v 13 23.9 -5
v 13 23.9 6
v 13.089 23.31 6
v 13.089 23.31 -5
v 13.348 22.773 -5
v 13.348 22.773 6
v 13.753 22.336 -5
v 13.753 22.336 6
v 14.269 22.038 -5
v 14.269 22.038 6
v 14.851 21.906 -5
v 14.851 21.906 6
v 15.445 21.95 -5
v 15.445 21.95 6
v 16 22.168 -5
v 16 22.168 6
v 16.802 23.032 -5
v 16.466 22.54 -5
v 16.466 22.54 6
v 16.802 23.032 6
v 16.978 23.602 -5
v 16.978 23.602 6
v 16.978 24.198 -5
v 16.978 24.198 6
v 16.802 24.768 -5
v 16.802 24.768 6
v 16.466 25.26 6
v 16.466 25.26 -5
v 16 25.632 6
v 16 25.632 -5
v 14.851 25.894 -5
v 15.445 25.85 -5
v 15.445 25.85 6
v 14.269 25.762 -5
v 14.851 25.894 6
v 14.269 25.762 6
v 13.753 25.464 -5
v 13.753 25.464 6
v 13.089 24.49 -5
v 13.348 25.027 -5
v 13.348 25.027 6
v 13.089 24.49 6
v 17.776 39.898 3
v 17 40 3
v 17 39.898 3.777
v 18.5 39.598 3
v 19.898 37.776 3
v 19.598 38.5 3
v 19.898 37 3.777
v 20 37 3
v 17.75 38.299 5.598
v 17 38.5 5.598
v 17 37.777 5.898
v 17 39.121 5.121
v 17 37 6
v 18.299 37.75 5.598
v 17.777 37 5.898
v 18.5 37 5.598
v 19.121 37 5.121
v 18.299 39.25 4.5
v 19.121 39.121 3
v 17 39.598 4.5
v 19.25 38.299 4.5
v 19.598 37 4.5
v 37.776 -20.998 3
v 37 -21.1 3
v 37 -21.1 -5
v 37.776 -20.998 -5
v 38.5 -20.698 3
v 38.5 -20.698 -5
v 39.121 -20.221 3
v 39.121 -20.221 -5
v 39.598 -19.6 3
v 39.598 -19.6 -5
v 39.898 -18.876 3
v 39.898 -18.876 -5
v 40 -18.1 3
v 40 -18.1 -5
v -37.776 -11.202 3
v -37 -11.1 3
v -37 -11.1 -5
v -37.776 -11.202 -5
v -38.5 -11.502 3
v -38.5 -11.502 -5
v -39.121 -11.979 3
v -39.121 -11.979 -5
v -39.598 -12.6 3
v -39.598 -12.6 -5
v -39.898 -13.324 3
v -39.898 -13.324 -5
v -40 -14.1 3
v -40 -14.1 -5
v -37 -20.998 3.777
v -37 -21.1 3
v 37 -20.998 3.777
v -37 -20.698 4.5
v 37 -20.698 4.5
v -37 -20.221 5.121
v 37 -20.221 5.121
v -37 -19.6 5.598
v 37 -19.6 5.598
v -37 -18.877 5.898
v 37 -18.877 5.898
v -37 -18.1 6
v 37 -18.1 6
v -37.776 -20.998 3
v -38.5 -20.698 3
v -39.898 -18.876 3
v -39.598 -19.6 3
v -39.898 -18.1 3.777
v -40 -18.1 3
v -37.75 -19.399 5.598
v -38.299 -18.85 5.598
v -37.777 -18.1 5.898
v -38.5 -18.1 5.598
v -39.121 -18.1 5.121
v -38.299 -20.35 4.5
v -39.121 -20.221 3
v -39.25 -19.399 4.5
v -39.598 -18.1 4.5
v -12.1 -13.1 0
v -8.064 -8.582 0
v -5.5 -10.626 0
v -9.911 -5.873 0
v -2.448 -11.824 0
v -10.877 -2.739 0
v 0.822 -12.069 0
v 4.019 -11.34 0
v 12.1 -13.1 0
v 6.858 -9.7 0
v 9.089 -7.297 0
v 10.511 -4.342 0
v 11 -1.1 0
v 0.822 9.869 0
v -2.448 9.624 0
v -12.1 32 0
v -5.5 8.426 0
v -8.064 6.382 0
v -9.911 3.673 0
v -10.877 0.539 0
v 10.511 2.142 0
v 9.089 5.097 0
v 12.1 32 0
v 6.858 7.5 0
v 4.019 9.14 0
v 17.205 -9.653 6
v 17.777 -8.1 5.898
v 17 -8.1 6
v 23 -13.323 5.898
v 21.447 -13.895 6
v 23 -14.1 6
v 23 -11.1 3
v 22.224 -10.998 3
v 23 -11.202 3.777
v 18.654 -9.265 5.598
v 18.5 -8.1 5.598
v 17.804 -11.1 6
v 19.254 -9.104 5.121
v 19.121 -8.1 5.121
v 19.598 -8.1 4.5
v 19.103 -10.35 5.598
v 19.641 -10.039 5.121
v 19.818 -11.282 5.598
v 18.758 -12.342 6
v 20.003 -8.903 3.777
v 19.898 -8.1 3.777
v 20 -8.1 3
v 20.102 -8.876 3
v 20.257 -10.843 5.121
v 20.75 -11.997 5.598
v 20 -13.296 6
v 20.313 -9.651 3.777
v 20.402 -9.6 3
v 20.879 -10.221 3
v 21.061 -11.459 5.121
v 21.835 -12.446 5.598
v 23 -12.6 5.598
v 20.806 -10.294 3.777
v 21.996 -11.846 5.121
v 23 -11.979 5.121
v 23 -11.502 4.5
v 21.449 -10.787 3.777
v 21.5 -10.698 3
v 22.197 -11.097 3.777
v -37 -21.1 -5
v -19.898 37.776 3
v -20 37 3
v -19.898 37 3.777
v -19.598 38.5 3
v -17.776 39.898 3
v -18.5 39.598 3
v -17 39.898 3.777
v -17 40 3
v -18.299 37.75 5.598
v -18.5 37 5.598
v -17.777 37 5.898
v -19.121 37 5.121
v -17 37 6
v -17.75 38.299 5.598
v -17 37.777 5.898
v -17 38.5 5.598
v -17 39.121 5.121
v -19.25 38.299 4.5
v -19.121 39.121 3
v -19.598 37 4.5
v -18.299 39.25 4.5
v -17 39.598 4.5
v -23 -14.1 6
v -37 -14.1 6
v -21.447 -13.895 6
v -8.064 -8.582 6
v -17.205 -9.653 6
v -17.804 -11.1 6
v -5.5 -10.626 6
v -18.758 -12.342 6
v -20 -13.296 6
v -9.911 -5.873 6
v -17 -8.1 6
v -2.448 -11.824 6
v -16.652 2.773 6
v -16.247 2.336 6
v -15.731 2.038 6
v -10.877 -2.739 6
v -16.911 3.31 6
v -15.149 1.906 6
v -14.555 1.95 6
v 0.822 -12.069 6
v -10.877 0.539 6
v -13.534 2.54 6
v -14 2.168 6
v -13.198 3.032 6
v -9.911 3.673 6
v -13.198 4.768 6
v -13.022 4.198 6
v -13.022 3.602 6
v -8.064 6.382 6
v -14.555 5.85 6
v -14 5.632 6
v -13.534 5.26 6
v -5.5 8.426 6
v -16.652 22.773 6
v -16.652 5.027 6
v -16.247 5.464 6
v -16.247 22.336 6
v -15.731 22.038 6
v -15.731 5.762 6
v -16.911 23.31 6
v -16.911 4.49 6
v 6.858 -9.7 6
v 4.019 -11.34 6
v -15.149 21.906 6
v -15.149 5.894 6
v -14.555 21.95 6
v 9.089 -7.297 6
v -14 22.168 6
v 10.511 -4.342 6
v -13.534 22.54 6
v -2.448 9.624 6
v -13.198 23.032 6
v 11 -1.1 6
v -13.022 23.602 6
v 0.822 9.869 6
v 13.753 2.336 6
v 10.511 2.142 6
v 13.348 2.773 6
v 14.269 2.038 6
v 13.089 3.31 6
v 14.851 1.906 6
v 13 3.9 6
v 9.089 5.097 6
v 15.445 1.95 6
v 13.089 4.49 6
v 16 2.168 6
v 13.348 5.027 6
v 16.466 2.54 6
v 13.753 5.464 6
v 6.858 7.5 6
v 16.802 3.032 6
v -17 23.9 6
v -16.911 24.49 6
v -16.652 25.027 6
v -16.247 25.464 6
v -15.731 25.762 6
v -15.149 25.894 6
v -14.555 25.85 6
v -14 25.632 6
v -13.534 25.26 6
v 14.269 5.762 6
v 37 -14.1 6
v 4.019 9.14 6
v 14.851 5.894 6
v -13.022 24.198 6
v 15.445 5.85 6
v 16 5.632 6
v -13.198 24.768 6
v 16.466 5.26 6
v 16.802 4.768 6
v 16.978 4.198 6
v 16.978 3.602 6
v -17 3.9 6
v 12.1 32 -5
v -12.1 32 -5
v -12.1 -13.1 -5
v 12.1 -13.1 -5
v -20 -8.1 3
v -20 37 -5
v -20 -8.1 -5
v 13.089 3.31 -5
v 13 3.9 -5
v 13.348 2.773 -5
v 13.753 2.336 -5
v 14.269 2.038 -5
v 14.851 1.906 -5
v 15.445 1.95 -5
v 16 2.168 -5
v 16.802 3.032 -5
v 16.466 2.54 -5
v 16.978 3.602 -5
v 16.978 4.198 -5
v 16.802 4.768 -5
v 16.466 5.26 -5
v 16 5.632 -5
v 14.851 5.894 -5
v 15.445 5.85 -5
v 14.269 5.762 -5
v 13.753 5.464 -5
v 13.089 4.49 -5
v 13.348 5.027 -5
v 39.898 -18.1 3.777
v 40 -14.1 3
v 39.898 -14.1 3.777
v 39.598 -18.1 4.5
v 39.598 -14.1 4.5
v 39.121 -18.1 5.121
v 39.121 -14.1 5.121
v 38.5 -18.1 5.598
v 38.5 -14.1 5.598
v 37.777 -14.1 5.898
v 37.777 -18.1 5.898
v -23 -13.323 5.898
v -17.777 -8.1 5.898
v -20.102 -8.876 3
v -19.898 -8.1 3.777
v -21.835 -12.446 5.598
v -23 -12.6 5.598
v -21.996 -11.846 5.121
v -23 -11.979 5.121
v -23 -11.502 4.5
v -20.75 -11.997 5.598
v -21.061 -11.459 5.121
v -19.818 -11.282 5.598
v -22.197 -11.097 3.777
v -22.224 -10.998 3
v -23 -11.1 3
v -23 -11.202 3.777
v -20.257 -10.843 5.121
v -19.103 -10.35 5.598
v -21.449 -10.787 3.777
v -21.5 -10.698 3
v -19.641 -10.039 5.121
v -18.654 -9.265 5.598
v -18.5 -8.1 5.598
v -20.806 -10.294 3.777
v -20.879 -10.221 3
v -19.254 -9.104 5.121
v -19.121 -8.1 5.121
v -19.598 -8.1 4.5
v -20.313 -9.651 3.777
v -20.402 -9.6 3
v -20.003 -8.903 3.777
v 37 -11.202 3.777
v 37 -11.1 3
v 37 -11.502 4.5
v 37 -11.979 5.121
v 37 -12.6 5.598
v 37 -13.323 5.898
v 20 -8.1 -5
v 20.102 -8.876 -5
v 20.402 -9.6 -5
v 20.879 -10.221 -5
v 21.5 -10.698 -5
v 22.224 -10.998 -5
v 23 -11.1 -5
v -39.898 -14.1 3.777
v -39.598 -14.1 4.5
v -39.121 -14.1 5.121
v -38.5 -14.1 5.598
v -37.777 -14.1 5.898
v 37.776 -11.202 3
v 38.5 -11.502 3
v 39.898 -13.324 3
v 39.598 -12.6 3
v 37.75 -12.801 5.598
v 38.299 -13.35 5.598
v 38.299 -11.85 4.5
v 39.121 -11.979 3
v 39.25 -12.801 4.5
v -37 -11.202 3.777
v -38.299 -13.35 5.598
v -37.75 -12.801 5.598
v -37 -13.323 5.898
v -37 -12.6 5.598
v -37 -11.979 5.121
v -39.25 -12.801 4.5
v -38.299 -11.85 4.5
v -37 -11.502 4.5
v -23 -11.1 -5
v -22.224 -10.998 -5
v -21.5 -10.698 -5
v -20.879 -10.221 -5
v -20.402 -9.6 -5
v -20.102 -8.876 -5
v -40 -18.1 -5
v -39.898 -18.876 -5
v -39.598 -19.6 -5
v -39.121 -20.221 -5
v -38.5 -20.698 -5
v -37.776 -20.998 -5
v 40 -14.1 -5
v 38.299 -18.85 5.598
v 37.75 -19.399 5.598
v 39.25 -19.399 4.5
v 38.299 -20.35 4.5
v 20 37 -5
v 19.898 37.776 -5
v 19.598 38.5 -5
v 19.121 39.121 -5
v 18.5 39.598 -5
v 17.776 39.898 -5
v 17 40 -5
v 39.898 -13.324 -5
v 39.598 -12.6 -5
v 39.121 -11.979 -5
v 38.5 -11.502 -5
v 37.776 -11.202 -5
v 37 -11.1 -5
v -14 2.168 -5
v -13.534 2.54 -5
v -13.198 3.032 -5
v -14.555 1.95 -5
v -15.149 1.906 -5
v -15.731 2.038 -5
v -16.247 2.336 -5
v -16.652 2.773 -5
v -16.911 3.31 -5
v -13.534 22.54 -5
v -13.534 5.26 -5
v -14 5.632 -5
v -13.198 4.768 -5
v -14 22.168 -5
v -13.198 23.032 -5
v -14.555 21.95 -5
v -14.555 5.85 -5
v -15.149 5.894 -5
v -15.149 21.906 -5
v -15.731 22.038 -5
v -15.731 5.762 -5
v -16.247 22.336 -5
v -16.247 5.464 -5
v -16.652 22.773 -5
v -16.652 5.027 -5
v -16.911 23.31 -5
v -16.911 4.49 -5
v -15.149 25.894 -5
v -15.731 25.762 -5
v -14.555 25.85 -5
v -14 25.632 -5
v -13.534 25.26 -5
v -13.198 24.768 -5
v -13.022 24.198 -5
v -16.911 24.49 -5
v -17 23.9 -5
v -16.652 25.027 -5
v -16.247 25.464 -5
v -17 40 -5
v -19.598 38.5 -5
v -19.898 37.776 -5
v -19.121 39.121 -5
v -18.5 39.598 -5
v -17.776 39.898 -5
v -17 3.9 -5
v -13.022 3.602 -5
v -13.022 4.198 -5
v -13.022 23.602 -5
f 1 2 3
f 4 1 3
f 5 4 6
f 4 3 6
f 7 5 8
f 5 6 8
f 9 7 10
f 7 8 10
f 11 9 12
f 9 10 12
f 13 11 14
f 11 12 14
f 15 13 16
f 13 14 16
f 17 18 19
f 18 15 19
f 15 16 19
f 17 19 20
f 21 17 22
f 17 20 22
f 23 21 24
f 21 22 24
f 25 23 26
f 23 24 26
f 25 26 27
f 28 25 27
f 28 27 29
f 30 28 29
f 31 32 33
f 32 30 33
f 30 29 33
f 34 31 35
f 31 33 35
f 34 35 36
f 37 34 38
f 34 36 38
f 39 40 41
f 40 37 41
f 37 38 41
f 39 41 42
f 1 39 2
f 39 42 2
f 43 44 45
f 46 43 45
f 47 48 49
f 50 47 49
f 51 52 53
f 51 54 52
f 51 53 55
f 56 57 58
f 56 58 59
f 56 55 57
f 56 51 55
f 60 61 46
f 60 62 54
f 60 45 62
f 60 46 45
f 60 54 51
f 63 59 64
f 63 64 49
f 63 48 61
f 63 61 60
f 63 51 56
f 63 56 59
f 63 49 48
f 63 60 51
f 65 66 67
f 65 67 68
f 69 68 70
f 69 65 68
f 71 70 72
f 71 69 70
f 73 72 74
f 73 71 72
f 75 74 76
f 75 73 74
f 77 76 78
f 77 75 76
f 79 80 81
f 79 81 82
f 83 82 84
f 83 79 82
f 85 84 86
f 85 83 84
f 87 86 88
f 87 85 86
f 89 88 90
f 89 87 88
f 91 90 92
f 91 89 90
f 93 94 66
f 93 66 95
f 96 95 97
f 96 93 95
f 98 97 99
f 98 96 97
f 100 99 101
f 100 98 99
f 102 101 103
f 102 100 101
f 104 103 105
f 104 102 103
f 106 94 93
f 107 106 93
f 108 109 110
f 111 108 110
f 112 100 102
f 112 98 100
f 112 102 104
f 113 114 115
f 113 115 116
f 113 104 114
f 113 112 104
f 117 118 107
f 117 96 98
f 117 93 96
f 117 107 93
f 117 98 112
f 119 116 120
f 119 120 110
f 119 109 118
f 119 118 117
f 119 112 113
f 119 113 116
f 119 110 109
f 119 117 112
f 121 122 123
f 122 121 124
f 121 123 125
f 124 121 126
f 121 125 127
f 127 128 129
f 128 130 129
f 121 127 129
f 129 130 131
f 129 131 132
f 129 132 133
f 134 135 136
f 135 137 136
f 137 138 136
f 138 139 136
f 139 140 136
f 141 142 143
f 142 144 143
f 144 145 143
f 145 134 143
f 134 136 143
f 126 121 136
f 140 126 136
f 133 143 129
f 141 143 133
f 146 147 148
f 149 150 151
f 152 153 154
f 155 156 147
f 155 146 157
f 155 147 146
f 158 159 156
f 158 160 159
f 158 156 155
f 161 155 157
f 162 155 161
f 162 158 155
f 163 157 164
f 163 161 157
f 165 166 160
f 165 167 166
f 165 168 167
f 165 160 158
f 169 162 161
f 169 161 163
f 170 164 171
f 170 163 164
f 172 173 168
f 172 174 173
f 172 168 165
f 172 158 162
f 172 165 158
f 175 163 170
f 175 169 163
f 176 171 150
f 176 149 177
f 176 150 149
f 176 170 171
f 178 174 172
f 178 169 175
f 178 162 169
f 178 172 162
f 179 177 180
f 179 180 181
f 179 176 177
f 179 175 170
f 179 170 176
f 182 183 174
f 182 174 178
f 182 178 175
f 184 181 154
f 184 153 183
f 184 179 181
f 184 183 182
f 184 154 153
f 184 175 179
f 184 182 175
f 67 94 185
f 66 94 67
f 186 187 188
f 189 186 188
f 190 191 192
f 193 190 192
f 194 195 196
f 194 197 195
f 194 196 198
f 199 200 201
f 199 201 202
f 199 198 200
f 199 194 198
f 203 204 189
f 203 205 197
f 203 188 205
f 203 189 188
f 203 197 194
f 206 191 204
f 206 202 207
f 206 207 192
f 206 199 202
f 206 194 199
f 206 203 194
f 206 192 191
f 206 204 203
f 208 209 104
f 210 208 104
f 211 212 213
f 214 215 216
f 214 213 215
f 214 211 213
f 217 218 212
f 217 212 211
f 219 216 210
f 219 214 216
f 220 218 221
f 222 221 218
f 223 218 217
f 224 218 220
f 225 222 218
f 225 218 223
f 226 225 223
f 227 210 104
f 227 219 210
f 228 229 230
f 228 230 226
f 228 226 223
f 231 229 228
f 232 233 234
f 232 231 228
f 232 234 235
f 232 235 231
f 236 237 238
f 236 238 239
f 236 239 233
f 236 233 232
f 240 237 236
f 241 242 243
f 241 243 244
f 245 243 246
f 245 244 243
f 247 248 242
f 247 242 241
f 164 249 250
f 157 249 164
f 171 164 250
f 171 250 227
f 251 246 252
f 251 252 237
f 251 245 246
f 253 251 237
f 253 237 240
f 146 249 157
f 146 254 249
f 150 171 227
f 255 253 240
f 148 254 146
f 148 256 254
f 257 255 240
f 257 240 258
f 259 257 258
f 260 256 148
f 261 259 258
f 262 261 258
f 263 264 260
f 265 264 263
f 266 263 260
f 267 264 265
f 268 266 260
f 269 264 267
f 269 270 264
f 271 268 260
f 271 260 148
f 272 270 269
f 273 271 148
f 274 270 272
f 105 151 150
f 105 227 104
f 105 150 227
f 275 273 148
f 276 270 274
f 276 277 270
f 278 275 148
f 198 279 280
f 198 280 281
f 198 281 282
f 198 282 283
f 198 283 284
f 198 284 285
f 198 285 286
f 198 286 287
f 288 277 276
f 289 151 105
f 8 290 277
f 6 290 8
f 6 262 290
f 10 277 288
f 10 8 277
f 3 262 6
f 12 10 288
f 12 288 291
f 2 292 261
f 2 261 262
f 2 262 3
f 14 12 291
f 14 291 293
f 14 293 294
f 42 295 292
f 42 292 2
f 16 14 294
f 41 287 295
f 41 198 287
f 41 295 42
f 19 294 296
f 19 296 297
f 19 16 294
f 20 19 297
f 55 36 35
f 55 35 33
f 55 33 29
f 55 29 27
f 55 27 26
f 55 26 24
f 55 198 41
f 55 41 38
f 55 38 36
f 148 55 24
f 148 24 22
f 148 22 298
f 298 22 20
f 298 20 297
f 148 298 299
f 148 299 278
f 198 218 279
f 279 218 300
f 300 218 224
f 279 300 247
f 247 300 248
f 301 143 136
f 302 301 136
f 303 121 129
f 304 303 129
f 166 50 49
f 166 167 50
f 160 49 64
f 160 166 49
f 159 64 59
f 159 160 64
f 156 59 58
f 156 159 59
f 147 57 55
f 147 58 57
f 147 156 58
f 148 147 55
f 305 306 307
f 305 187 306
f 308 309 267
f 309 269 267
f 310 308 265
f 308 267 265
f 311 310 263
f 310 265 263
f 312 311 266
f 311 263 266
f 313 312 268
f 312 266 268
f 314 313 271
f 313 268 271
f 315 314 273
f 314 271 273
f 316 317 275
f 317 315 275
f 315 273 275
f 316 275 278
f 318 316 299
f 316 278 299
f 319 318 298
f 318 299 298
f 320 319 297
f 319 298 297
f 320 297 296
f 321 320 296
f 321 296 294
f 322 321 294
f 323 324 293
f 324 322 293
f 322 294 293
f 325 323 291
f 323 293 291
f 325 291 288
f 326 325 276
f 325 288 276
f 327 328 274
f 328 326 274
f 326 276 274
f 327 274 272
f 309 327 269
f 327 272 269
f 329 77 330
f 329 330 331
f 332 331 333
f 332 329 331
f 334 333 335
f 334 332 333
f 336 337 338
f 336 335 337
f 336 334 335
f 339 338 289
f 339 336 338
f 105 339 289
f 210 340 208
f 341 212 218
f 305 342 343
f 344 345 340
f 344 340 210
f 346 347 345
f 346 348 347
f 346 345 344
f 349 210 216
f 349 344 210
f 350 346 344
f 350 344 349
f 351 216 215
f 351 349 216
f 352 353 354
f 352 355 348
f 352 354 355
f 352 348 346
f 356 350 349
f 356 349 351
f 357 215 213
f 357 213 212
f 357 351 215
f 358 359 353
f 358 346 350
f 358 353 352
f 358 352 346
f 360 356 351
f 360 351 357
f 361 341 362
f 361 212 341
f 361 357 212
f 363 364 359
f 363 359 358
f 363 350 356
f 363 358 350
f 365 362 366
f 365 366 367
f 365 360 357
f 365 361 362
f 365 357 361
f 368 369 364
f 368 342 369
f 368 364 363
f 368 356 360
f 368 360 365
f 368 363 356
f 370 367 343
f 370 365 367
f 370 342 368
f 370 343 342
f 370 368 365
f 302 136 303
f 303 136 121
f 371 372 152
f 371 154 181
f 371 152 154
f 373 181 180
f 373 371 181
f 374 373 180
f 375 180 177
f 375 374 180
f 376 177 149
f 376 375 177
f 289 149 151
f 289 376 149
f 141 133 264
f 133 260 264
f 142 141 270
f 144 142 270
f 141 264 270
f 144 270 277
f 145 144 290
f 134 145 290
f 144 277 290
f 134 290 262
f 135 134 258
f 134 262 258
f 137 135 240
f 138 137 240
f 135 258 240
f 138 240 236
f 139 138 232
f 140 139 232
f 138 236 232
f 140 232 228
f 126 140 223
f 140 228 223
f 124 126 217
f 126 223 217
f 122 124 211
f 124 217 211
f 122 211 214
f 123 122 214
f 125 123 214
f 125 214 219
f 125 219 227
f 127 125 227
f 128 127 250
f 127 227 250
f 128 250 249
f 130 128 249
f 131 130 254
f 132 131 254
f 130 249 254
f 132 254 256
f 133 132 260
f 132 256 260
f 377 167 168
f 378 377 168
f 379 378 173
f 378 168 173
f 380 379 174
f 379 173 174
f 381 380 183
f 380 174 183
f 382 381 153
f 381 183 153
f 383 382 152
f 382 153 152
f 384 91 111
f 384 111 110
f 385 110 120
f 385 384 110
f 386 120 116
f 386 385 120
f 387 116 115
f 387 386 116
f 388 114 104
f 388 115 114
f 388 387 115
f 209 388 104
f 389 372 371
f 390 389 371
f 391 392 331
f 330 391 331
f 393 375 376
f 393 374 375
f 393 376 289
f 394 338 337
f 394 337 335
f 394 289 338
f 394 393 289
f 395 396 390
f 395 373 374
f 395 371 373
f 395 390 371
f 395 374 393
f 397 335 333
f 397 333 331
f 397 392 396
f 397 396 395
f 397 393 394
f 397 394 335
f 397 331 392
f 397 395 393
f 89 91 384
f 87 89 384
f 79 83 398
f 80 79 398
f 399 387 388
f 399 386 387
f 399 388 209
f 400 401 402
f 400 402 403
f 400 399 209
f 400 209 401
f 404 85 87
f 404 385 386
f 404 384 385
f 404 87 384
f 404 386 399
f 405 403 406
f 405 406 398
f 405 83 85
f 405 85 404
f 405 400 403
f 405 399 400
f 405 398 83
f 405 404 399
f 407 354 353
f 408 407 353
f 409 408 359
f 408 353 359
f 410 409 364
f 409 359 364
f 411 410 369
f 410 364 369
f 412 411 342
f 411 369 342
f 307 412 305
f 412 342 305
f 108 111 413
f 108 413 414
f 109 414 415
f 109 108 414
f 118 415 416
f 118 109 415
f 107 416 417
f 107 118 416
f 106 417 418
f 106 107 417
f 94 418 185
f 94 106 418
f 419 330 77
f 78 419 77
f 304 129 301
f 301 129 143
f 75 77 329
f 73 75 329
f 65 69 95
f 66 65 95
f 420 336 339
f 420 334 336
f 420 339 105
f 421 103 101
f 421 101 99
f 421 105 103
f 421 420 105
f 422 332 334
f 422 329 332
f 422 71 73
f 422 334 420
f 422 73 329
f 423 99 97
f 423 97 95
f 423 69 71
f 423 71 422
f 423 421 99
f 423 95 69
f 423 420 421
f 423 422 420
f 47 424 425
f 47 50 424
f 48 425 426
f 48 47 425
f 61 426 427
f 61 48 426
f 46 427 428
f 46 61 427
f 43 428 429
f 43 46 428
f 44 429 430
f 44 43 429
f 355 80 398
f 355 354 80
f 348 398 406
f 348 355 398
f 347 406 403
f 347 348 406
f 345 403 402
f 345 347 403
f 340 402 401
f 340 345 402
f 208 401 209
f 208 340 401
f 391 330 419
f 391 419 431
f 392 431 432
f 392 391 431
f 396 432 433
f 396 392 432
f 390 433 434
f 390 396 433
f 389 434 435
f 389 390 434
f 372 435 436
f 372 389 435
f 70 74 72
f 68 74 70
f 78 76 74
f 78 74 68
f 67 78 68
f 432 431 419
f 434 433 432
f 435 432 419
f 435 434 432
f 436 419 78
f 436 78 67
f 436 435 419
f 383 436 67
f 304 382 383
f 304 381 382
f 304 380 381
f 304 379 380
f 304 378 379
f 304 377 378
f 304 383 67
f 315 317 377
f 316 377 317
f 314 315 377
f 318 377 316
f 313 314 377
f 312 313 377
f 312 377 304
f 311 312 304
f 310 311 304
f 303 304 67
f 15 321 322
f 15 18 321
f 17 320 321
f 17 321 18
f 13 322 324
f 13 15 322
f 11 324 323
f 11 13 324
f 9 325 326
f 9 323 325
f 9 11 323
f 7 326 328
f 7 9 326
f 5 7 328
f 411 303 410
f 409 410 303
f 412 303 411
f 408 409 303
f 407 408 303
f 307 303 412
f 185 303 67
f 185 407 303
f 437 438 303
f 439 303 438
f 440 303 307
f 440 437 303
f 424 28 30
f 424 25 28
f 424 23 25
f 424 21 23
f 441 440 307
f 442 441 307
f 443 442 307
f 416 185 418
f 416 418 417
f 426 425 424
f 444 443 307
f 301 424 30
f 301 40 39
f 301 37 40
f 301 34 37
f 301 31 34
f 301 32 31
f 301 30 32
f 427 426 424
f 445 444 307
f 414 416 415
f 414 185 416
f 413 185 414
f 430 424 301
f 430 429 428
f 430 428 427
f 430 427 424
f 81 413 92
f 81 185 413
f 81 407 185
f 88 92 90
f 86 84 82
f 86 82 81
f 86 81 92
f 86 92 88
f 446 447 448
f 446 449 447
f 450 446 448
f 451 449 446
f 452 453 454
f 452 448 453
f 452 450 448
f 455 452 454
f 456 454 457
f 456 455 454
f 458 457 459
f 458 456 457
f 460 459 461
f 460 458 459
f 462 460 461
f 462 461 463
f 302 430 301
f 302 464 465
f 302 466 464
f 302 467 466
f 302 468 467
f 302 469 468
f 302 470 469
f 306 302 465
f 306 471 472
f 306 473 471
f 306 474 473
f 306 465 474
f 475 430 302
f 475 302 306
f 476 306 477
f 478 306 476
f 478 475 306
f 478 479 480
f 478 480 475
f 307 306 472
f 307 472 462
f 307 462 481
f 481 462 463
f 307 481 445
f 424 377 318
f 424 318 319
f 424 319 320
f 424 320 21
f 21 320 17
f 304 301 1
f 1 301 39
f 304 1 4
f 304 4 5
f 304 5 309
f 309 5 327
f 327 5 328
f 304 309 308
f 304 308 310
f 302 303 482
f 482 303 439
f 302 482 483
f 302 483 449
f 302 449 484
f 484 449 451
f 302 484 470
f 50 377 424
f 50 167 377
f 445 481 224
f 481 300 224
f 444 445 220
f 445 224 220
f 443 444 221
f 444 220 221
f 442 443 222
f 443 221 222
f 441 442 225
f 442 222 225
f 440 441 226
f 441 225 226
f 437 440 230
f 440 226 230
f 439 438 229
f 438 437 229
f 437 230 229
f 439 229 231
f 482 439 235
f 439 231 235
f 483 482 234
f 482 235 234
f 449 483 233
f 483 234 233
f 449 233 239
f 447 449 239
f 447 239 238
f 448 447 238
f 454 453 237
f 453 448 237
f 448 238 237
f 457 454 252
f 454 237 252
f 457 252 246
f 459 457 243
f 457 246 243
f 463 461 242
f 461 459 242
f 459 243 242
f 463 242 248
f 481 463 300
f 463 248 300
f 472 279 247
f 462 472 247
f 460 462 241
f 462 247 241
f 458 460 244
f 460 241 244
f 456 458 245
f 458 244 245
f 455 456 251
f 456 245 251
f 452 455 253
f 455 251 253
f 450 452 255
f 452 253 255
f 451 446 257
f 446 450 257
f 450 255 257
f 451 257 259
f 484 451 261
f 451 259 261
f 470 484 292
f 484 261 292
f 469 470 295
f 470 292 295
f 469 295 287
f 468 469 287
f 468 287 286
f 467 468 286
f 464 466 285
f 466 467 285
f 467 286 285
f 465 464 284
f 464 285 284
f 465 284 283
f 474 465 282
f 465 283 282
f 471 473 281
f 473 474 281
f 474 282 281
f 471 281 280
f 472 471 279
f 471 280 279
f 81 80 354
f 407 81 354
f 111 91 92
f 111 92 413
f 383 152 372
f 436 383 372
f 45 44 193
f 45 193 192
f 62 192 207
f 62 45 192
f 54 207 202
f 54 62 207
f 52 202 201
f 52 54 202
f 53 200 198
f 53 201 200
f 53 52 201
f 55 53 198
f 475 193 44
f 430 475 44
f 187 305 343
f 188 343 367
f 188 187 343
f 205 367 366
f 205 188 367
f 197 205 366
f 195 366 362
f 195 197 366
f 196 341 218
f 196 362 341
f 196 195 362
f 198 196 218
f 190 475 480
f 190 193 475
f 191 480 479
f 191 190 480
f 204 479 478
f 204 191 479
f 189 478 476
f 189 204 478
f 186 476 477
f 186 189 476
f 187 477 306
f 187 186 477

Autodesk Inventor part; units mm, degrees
ref_plane "YZ Plane" through (0, 0, 0) normal (1, 0, 0) x (0, 1, 0)
ref_plane "XZ Plane" through (0, 0, 0) normal (0, 1, 0) x (-1, 0, 0)
ref_plane "XY Plane" through (0, 0, 0) normal (0, 0, 1) x (1, 0, 0)
sketch "Sketch1" plane through (0, 0, 0) normal (0, 0, 1) x (1, 0, 0)
  line L0 (-40, -40) -> (40, -40)
  line L1 (40, -40) -> (40, 40)
  line L2 (40, 40) -> (-40, 40)
  line L3 (-40, 40) -> (-40, -40)
  line L4 (-40, -40) -> (40, 40) construction
  line L5 (40, -40) -> (-40, 40) construction
  point P0 (0, 0)
  dimension "d0" = 80
  dimension "d1" = 80
extrude "Extrusion1" add sketch "Sketch1" along normal blind 6
sketch "Sketch2" plane through (0, 0, 0) normal (0, 0, -1) x (-1, 0, 0)
  arc A0 (37, -21.1) -> (40, -18.1) centre (37, -18.1) ccw projected
  line L0 (37, -21.1) -> (-37, -21.1) projected
  arc A1 (-40, -18.1) -> (-37, -21.1) centre (-37, -18.1) ccw projected
  line L1 (-40, -14.1) -> (-40, -18.1) projected
  arc A2 (-37, -11.1) -> (-40, -14.1) centre (-37, -14.1) ccw projected
  line L2 (-23, -11.1) -> (-37, -11.1) projected
  arc A3 (-23, -11.1) -> (-20, -8.1) centre (-23, -8.1) ccw projected
  line L3 (-20, -8.1) -> (-20, 37) projected
  arc A4 (-17, 40) -> (-20, 37) centre (-17, 37) ccw projected
  line L4 (17, 40) -> (-17, 40) projected
  arc A5 (20, 37) -> (17, 40) centre (17, 37) ccw projected
  line L5 (20, 37) -> (20, -8.1) projected
  arc A6 (20, -8.1) -> (23, -11.1) centre (23, -8.1) ccw projected
  line L6 (37, -11.1) -> (23, -11.1) projected
  arc A7 (40, -14.1) -> (37, -11.1) centre (37, -14.1) ccw projected
  line L7 (40, -14.1) -> (40, -18.1) projected
  circle A8 centre (15, 3.9) radius 2 projected
  circle A9 centre (-15, 3.9) radius 2 projected
  circle A10 centre (15, 23.9) radius 2 projected
  circle A11 centre (-15, 23.9) radius 2 projected
  line L8 (12.1, 32) -> (12.1, -13.1) projected
  line L9 (-12.1, 32) -> (12.1, 32) projected
  line L10 (-12.1, -13.1) -> (-12.1, 32) projected
  line L11 (12.1, -13.1) -> (-12.1, -13.1) projected
  circle A12 centre (0, -1.1) radius 7.5 projected
  line L12 (-40, -40) -> (40, -40)
  line L13 (40, -40) -> (40, 40)
  line L14 (40, 40) -> (-40, 40)
  line L15 (-40, 40) -> (-40, -40)
  line L16 (-40, -40) -> (40, 40) construction
  line L17 (40, -40) -> (-40, 40) construction
  line L18 (-40, 40) -> (40, 40) projected
  line L19 (40, 40) -> (40, -40) projected
  line L20 (-40, -40) -> (-40, 40) projected
  line L21 (40, -40) -> (-40, -40) projected
  point P0 (0, 0)
  point P1 (0, 0)
  point P2 (-40, -18.1)
extrude "Extrusion2" cut sketch "Sketch2" against normal blind 6 contours A0 L13 L12 L15 A1 L0 | A7 L6 A6 L5 A5 L14 L13 | L15 L14 A4 L3 A3 L2 A2 | A8 | A9 | A10 | A11 | A12
sketch "Sketch3" plane through (0, 0, 0) normal (0, 0, -1) x (-1, 0, 0)
  arc A0 (37, -21.1) -> (40, -18.1) centre (37, -18.1) ccw projected
  line L0 (37, -21.1) -> (-37, -21.1) projected
  arc A1 (-40, -18.1) -> (-37, -21.1) centre (-37, -18.1) ccw projected
  line L1 (-40, -14.1) -> (-40, -18.1) projected
  arc A2 (-37, -11.1) -> (-40, -14.1) centre (-37, -14.1) ccw projected
  line L2 (-23, -11.1) -> (-37, -11.1) projected
  arc A3 (-23, -11.1) -> (-20, -8.1) centre (-23, -8.1) ccw projected
  line L3 (-20, -8.1) -> (-20, 37) projected
  arc A4 (-17, 40) -> (-20, 37) centre (-17, 37) ccw projected
  line L4 (17, 40) -> (-17, 40) projected
  arc A5 (20, 37) -> (17, 40) centre (17, 37) ccw projected
  line L5 (20, 37) -> (20, -8.1) projected
  arc A6 (20, -8.1) -> (23, -11.1) centre (23, -8.1) ccw projected
  line L6 (37, -11.1) -> (23, -11.1) projected
  arc A7 (40, -14.1) -> (37, -11.1) centre (37, -14.1) ccw projected
  line L7 (40, -14.1) -> (40, -18.1) projected
  circle A8 centre (15, 3.9) radius 2 projected
  circle A9 centre (-15, 3.9) radius 2 projected
  circle A10 centre (15, 23.9) radius 2 projected
  circle A11 centre (-15, 23.9) radius 2 projected
  line L8 (12.1, 32) -> (12.1, -13.1) projected
  line L9 (-12.1, 32) -> (12.1, 32) projected
  line L10 (-12.1, -13.1) -> (-12.1, 32) projected
  line L11 (12.1, -13.1) -> (-12.1, -13.1) projected
  point P0 (0, 0)
extrude "Extrusion3" add sketch "Sketch3" along normal blind 5
sketch "Sketch4" plane through (0, 0, 6) normal (0, 0, 1) x (1, 0, 0)
  circle A0 centre (0, -1.1) radius 7.5 projected
  circle A1 centre (0, -1.1) radius 11
  point P0 (0, 0)
  dimension "d8" = 22
extrude "Extrusion4" cut sketch "Sketch4" against normal through all
fillet "Fillet1" radius 3 16 edges at (-19.1213, 39.1213, 6) (-20, 14.45, 6) (-20.8787, -10.2213, 6) (-30, -11.1, 6) (-39.1213, -11.9787, 6) (-40, -16.1, 6) (-39.1213, -20.2213, 6) (0, -21.1, 6) (39.1213, -20.2213, 6) (40, -16.1, 6) (39.1213, -11.9787, 6) (30, -11.1, 6) (20.8787, -10.2213, 6) (20, 14.45, 6) (19.1213, 39.1213, 6) (0, 40, 6)
properties part number "stopper_motor_bracket_cover"
